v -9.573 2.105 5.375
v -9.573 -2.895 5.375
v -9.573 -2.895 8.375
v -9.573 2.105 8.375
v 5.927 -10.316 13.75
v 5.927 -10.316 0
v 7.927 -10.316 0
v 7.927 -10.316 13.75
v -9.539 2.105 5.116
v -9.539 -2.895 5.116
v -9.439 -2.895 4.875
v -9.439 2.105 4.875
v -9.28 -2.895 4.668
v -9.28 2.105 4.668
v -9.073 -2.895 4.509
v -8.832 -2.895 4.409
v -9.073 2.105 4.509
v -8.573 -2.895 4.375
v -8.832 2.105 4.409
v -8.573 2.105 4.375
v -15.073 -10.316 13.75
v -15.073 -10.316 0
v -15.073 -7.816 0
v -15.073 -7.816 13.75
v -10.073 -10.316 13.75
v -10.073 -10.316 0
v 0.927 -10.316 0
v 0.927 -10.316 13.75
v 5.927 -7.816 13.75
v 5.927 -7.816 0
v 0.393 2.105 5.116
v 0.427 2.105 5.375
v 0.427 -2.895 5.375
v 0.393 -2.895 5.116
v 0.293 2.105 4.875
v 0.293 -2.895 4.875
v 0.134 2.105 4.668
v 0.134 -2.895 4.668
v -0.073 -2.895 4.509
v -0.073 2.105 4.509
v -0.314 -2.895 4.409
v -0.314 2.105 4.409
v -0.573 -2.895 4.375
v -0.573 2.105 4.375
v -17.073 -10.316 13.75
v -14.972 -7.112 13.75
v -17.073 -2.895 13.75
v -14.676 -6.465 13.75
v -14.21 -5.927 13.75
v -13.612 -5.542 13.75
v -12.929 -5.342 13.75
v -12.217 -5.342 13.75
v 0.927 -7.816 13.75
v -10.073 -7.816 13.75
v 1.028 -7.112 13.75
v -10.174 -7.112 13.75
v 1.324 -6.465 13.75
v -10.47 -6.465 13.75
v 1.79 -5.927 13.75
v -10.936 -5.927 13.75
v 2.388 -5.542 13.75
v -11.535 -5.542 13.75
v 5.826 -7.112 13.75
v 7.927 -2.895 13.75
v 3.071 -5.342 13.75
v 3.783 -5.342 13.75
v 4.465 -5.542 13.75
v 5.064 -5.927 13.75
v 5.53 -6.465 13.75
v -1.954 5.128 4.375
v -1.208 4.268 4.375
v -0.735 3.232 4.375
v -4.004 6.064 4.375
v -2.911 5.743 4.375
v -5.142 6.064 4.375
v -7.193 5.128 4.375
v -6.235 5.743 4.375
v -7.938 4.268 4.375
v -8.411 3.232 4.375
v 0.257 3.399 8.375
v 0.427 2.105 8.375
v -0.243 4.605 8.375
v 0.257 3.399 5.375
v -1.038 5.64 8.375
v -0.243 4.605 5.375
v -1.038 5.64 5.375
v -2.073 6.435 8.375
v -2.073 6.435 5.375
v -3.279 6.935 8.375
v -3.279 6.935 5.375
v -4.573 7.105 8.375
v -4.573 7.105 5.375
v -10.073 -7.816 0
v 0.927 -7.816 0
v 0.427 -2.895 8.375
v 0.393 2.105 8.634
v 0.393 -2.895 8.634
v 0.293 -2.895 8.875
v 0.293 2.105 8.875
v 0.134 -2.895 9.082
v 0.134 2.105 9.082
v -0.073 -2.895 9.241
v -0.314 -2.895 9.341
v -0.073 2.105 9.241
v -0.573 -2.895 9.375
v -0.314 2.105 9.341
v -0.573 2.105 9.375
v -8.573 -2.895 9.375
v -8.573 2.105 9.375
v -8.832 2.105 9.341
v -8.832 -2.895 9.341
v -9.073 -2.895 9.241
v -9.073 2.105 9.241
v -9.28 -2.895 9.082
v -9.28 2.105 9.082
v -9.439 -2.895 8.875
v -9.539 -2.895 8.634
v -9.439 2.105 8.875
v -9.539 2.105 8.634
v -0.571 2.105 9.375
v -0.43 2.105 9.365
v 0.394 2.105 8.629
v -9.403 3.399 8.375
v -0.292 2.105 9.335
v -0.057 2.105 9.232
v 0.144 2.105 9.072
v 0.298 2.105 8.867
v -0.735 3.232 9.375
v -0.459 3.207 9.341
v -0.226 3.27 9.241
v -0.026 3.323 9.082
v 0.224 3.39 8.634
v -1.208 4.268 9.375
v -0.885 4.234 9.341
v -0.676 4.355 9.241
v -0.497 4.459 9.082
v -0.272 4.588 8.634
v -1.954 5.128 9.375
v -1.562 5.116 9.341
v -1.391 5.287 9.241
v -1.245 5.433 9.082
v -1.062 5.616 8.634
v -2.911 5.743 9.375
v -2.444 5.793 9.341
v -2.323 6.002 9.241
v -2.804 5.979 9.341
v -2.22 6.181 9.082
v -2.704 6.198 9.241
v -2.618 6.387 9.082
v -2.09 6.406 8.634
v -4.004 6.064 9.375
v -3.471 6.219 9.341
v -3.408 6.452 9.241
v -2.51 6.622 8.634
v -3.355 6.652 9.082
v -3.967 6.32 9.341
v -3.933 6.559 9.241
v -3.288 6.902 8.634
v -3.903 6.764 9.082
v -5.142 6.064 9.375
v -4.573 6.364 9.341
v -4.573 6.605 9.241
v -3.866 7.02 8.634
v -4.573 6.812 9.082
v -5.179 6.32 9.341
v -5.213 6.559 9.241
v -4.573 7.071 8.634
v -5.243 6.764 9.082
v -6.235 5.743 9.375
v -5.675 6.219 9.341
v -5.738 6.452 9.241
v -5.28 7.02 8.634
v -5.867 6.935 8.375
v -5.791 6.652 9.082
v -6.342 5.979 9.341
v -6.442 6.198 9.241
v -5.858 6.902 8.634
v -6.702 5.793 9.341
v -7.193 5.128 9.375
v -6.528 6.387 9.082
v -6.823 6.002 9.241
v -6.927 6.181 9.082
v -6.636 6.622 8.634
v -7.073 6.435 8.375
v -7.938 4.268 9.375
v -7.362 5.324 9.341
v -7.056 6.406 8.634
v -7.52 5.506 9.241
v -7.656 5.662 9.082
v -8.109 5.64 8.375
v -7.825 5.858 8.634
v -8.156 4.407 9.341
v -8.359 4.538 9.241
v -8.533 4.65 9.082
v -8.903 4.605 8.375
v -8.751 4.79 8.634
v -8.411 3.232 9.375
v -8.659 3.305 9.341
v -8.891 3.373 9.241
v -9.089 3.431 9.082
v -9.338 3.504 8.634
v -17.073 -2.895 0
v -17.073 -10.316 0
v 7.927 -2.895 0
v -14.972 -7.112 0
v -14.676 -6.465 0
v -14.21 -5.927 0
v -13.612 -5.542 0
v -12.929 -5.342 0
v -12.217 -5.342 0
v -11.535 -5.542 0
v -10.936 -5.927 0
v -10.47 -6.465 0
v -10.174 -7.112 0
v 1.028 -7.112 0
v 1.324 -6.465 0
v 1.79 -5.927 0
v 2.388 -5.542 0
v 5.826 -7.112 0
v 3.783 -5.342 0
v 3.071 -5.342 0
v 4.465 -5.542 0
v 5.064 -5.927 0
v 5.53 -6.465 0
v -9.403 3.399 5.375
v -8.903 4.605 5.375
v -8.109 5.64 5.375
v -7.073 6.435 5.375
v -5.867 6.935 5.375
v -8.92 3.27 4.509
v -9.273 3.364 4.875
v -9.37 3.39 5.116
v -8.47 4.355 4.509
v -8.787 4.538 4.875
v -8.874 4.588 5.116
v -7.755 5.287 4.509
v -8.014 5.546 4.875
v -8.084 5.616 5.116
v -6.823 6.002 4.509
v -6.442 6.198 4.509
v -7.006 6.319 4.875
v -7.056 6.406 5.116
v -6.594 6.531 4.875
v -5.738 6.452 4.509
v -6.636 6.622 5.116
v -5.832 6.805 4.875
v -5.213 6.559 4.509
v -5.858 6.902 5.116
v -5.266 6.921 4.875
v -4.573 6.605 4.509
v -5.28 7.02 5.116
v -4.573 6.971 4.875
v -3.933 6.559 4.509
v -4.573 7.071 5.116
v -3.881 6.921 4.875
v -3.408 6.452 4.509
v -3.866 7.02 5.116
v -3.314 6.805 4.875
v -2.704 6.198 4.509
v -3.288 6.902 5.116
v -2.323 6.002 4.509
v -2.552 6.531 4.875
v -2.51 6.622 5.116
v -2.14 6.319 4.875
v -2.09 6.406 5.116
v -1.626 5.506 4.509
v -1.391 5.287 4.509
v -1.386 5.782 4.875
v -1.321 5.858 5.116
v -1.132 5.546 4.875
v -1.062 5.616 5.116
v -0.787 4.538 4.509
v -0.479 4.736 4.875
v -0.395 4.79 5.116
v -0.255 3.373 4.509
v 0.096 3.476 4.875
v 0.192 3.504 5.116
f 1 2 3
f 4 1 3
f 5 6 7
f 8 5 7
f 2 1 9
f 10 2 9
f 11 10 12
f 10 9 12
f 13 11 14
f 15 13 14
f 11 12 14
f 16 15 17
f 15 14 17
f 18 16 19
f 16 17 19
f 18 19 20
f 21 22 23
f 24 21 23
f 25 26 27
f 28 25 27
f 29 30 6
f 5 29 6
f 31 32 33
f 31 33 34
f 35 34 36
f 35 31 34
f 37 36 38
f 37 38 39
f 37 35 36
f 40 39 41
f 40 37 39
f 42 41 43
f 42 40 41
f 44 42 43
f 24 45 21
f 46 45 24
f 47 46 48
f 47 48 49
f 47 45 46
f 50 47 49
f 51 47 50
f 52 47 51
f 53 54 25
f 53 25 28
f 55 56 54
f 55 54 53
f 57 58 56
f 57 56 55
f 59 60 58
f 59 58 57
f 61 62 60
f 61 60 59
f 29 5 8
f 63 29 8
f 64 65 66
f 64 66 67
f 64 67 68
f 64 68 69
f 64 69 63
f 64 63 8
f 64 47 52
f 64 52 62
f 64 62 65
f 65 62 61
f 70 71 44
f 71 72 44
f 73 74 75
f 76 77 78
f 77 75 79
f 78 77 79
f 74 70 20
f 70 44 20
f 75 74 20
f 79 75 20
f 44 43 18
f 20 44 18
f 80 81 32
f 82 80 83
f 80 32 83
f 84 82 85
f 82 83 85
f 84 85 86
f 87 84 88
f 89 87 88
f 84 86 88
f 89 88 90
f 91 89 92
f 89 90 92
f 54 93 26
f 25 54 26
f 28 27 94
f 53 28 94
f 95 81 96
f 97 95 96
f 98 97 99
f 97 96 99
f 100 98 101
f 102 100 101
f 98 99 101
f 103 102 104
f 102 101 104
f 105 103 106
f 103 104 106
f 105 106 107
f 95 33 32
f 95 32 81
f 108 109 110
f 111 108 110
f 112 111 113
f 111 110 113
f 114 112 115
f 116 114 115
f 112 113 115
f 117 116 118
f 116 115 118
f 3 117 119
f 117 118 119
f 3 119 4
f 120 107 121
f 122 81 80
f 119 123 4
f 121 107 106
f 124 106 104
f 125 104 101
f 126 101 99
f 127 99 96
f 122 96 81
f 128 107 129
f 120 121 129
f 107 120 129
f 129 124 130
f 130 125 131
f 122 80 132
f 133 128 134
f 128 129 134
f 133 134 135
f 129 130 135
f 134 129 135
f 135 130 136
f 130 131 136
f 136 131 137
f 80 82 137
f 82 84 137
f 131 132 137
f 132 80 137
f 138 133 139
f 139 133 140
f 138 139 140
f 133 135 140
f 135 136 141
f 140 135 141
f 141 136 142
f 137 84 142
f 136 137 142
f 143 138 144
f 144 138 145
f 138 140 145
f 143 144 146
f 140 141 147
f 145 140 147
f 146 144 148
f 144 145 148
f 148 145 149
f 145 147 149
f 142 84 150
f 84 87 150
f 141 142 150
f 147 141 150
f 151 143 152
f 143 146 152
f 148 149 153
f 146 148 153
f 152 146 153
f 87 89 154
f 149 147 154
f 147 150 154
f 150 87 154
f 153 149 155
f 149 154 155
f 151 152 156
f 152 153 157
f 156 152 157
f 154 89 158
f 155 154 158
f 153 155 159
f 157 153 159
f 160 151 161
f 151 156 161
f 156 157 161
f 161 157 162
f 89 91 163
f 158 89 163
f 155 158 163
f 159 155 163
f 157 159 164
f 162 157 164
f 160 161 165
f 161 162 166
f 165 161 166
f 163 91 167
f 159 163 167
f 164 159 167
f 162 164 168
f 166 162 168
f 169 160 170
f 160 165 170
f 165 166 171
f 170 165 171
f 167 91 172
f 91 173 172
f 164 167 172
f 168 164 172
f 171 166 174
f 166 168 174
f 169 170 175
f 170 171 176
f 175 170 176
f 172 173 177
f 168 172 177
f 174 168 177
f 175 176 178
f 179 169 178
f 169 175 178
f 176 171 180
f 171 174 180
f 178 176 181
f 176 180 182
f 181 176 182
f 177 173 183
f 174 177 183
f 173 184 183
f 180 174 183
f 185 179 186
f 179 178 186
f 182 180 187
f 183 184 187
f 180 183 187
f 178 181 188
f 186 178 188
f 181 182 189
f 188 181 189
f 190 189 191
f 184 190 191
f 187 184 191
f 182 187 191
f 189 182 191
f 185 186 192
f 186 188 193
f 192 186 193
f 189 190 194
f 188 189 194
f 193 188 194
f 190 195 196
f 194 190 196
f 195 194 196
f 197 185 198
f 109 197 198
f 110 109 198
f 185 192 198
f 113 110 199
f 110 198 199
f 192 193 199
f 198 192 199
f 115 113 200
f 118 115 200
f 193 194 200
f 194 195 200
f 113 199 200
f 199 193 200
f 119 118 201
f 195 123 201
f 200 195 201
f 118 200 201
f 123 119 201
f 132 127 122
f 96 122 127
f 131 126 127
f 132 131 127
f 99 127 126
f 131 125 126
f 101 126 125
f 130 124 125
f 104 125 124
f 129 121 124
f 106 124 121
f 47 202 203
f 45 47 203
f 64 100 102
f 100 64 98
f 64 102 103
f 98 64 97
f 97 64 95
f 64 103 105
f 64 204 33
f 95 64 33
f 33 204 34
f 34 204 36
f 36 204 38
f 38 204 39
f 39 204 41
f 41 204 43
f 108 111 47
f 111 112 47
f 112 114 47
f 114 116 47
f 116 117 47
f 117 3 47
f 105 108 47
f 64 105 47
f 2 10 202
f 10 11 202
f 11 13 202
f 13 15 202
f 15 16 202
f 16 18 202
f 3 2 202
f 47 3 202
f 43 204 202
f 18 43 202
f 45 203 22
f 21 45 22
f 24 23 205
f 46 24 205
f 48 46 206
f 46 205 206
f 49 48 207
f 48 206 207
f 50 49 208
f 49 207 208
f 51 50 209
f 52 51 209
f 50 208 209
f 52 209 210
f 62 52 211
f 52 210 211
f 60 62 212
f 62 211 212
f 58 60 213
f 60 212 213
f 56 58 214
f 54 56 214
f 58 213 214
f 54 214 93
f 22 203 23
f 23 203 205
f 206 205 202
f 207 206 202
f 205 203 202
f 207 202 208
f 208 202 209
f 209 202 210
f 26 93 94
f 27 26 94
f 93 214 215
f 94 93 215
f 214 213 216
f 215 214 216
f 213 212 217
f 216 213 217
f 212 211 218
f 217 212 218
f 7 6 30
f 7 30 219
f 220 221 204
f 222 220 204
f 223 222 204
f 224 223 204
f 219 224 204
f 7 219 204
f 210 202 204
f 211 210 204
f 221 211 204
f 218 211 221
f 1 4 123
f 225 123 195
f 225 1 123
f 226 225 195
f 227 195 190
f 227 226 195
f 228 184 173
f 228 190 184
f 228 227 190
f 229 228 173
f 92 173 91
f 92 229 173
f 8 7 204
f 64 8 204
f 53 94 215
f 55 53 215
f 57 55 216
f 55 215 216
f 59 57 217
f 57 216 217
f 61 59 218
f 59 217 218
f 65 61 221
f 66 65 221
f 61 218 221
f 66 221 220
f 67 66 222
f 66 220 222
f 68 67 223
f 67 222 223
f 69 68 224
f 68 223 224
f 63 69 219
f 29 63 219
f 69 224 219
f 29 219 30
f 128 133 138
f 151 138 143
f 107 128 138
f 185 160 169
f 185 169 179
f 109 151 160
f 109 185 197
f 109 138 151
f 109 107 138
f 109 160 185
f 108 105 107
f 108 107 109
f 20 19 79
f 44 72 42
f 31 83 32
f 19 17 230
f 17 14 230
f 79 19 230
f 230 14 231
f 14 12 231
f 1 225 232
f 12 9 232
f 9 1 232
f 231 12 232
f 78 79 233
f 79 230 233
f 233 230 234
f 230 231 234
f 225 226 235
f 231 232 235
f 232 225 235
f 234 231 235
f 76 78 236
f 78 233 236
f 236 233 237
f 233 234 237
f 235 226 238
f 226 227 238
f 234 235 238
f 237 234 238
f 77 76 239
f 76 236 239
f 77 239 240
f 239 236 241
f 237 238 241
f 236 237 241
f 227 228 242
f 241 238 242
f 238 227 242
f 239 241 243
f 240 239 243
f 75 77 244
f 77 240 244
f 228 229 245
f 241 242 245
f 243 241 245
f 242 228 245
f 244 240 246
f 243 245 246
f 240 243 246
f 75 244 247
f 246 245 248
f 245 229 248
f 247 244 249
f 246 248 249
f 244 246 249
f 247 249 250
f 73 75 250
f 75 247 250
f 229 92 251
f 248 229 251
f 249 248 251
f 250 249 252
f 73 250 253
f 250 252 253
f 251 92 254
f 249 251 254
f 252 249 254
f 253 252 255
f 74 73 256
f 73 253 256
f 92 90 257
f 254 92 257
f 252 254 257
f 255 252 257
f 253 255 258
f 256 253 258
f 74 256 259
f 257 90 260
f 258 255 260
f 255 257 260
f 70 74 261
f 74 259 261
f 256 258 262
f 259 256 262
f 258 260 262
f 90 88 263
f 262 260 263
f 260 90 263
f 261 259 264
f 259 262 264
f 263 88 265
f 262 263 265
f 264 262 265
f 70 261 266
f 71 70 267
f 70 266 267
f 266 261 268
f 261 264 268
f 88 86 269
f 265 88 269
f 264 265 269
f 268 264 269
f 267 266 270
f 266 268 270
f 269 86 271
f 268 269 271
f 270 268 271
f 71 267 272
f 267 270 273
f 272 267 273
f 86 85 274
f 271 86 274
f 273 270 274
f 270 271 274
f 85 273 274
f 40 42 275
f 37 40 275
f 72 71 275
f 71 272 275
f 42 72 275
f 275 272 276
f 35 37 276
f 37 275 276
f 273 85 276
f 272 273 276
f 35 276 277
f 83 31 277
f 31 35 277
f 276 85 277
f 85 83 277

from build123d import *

# Parameters (mm, degrees)
F1_DEPTH     = 13.75
F2_W         = 10
F2_H         = 5
F3_DEPTH     = 10
F4_R         = 1
F5_T1_DEPTH  = 5
F5_T4_ANGLE  = 90
F5_T6_ANGLE  = 90
F5_T8_ANGLE  = 90
F5_T10_ANGLE = 90


# Not quite as in the source:
# - a fillet or chamfer that OpenCascade refuses, or shapes differently, is made with other operations: its cross-section is extruded or revolved along the edge and cut away or added


with BuildPart() as f1:
    # F0 (on Top) → F1 (new body)
    with BuildSketch(Plane.XY):
        with BuildLine():
            Line((7.9270144597, -2.8950429987), (-17.0730578044, -2.8950429987))
            Line((-17.0730578044, -2.8950429987), (-17.0730578044, -7.8164328754))
            Line((-17.0730578044, -7.8164328754), (-17.0730578044, -10.3164328754))
            Line((-17.0730578044, -10.3164328754), (-15.0730578044, -10.3164328754))
            Line((-15.0730578044, -10.3164328754), (-15.0730578044, -7.8164328754))
            ThreePointArc((-15.0730578044, -7.8164328754), (-12.5730578044, -5.3164328754), (-10.0730578044, -7.8164328754))
            Line((-10.0730578044, -7.8164328754), (-10.0730578044, -10.3164328754))
            Line((-10.0730578044, -10.3164328754), (0.9269421956, -10.3164328754))
            Line((0.9269421956, -10.3164328754), (0.9269421956, -7.8164328754))
            ThreePointArc((0.9269421956, -7.8164328754), (3.4269421956, -5.3164328754), (5.9269421956, -7.8164328754))
            Line((5.9269421956, -7.8164328754), (5.9269421956, -10.3164328754))
            Line((5.9269421956, -10.3164328754), (7.9270144597, -10.3164328754))
            Line((7.9270144597, -10.3164328754), (7.9270144597, -7.8164328754))
            Line((7.9270144597, -7.8164328754), (7.9270144597, -2.8950429987))
        make_face()
    extrude(amount=F1_DEPTH)

    # F2 (on face) → F3 (join)
    with BuildSketch(Plane(origin=(0, -2.8950429987, 0), x_dir=(-1, 0, 0), z_dir=(0, 1, 0))):
        with Locations((4.5730578044, 6.875)):
            Rectangle(F2_W, F2_H)
    extrude(amount=F3_DEPTH)

    # F4
    f4_edges = [f1.edges().sort_by_distance(p)[0] for p in [
        (-4.573058, 7.104957, 9.375),
        (-4.573058, 7.104957, 4.375),
        (-9.573058, 2.104957, 4.375),
        (-9.573058, 2.104957, 9.375),
        (0.426942, 2.104957, 9.375),
        (0.426942, 2.104957, 4.375),
    ]]
    fillet(f4_edges, radius=F4_R)

    # F5: fillet of radius 5 on 2 edges, made by hand

    # F5_s2 → F5_t1 (cut)
    with BuildSketch(Plane.XY.offset(4.375)):
        with BuildLine():
            ThreePointArc((-9.5730578044, 2.1049570013), (-8.1085917103, 5.6404909072), (-4.5730578044, 7.1049570013))
            Line((-4.5730578044, 7.1049570013), (-9.5730578044, 7.1049570013))
            Line((-9.5730578044, 7.1049570013), (-9.5730578044, 2.1049570013))
        make_face()
        with BuildLine():
            ThreePointArc((0.4269421956, 2.1049570013), (-1.0375238985, 5.6404909072), (-4.5730578044, 7.1049570013))
            Line((-4.5730578044, 7.1049570013), (0.4269421956, 7.1049570013))
            Line((0.4269421956, 7.1049570013), (0.4269421956, 2.1049570013))
        make_face()
    extrude(amount=F5_T1_DEPTH, mode=Mode.SUBTRACT)

    # F5_s3 → F5_t4 (revolve, cut)
    with BuildSketch(Plane.XZ.offset(-2.1049570013)):
        with BuildLine():
            ThreePointArc((-0.5730578044, 9.375), (0.1340489768, 9.0821067812), (0.4269421956, 8.375))
            Line((0.4269421956, 8.375), (0.4269421956, 9.375))
            Line((0.4269421956, 9.375), (-0.5730578044, 9.375))
        make_face()
    revolve(axis=Axis((-4.5730578044, 2.1049570013, 9.375), (0, 0, 1)), revolution_arc=F5_T4_ANGLE, mode=Mode.SUBTRACT)

    # F5_s5 → F5_t6 (revolve, cut)
    with BuildSketch(Plane.YZ.offset(-4.5730578044)):
        with BuildLine():
            ThreePointArc((6.1049570013, 4.375), (6.8120637825, 4.6678932188), (7.1049570013, 5.375))
            Line((7.1049570013, 5.375), (7.1049570013, 4.375))
            Line((7.1049570013, 4.375), (6.1049570013, 4.375))
        make_face()
    revolve(axis=Axis((-4.5730578044, 2.1049570013, 4.375), (0, 0, -1)), revolution_arc=F5_T6_ANGLE, mode=Mode.SUBTRACT)

    # F5_s7 → F5_t8 (revolve, cut)
    with BuildSketch(Plane.XZ.offset(-2.1049570013)):
        with BuildLine():
            ThreePointArc((-8.5730578044, 4.375), (-9.2801645856, 4.6678932188), (-9.5730578044, 5.375))
            Line((-9.5730578044, 5.375), (-9.5730578044, 4.375))
            Line((-9.5730578044, 4.375), (-8.5730578044, 4.375))
        make_face()
    revolve(axis=Axis((-4.5730578044, 2.1049570013, 4.375), (0, 0, -1)), revolution_arc=F5_T8_ANGLE, mode=Mode.SUBTRACT)

    # F5_s9 → F5_t10 (revolve, cut)
    with BuildSketch(Plane.YZ.offset(-4.5730578044)):
        with BuildLine():
            ThreePointArc((6.1049570013, 9.375), (6.8120637825, 9.0821067812), (7.1049570013, 8.375))
            Line((7.1049570013, 8.375), (7.1049570013, 9.375))
            Line((7.1049570013, 9.375), (6.1049570013, 9.375))
        make_face()
    revolve(axis=Axis((-4.5730578044, 2.1049570013, 9.375), (0, 0, 1)), revolution_arc=F5_T10_ANGLE, mode=Mode.SUBTRACT)


solid = f1.part
